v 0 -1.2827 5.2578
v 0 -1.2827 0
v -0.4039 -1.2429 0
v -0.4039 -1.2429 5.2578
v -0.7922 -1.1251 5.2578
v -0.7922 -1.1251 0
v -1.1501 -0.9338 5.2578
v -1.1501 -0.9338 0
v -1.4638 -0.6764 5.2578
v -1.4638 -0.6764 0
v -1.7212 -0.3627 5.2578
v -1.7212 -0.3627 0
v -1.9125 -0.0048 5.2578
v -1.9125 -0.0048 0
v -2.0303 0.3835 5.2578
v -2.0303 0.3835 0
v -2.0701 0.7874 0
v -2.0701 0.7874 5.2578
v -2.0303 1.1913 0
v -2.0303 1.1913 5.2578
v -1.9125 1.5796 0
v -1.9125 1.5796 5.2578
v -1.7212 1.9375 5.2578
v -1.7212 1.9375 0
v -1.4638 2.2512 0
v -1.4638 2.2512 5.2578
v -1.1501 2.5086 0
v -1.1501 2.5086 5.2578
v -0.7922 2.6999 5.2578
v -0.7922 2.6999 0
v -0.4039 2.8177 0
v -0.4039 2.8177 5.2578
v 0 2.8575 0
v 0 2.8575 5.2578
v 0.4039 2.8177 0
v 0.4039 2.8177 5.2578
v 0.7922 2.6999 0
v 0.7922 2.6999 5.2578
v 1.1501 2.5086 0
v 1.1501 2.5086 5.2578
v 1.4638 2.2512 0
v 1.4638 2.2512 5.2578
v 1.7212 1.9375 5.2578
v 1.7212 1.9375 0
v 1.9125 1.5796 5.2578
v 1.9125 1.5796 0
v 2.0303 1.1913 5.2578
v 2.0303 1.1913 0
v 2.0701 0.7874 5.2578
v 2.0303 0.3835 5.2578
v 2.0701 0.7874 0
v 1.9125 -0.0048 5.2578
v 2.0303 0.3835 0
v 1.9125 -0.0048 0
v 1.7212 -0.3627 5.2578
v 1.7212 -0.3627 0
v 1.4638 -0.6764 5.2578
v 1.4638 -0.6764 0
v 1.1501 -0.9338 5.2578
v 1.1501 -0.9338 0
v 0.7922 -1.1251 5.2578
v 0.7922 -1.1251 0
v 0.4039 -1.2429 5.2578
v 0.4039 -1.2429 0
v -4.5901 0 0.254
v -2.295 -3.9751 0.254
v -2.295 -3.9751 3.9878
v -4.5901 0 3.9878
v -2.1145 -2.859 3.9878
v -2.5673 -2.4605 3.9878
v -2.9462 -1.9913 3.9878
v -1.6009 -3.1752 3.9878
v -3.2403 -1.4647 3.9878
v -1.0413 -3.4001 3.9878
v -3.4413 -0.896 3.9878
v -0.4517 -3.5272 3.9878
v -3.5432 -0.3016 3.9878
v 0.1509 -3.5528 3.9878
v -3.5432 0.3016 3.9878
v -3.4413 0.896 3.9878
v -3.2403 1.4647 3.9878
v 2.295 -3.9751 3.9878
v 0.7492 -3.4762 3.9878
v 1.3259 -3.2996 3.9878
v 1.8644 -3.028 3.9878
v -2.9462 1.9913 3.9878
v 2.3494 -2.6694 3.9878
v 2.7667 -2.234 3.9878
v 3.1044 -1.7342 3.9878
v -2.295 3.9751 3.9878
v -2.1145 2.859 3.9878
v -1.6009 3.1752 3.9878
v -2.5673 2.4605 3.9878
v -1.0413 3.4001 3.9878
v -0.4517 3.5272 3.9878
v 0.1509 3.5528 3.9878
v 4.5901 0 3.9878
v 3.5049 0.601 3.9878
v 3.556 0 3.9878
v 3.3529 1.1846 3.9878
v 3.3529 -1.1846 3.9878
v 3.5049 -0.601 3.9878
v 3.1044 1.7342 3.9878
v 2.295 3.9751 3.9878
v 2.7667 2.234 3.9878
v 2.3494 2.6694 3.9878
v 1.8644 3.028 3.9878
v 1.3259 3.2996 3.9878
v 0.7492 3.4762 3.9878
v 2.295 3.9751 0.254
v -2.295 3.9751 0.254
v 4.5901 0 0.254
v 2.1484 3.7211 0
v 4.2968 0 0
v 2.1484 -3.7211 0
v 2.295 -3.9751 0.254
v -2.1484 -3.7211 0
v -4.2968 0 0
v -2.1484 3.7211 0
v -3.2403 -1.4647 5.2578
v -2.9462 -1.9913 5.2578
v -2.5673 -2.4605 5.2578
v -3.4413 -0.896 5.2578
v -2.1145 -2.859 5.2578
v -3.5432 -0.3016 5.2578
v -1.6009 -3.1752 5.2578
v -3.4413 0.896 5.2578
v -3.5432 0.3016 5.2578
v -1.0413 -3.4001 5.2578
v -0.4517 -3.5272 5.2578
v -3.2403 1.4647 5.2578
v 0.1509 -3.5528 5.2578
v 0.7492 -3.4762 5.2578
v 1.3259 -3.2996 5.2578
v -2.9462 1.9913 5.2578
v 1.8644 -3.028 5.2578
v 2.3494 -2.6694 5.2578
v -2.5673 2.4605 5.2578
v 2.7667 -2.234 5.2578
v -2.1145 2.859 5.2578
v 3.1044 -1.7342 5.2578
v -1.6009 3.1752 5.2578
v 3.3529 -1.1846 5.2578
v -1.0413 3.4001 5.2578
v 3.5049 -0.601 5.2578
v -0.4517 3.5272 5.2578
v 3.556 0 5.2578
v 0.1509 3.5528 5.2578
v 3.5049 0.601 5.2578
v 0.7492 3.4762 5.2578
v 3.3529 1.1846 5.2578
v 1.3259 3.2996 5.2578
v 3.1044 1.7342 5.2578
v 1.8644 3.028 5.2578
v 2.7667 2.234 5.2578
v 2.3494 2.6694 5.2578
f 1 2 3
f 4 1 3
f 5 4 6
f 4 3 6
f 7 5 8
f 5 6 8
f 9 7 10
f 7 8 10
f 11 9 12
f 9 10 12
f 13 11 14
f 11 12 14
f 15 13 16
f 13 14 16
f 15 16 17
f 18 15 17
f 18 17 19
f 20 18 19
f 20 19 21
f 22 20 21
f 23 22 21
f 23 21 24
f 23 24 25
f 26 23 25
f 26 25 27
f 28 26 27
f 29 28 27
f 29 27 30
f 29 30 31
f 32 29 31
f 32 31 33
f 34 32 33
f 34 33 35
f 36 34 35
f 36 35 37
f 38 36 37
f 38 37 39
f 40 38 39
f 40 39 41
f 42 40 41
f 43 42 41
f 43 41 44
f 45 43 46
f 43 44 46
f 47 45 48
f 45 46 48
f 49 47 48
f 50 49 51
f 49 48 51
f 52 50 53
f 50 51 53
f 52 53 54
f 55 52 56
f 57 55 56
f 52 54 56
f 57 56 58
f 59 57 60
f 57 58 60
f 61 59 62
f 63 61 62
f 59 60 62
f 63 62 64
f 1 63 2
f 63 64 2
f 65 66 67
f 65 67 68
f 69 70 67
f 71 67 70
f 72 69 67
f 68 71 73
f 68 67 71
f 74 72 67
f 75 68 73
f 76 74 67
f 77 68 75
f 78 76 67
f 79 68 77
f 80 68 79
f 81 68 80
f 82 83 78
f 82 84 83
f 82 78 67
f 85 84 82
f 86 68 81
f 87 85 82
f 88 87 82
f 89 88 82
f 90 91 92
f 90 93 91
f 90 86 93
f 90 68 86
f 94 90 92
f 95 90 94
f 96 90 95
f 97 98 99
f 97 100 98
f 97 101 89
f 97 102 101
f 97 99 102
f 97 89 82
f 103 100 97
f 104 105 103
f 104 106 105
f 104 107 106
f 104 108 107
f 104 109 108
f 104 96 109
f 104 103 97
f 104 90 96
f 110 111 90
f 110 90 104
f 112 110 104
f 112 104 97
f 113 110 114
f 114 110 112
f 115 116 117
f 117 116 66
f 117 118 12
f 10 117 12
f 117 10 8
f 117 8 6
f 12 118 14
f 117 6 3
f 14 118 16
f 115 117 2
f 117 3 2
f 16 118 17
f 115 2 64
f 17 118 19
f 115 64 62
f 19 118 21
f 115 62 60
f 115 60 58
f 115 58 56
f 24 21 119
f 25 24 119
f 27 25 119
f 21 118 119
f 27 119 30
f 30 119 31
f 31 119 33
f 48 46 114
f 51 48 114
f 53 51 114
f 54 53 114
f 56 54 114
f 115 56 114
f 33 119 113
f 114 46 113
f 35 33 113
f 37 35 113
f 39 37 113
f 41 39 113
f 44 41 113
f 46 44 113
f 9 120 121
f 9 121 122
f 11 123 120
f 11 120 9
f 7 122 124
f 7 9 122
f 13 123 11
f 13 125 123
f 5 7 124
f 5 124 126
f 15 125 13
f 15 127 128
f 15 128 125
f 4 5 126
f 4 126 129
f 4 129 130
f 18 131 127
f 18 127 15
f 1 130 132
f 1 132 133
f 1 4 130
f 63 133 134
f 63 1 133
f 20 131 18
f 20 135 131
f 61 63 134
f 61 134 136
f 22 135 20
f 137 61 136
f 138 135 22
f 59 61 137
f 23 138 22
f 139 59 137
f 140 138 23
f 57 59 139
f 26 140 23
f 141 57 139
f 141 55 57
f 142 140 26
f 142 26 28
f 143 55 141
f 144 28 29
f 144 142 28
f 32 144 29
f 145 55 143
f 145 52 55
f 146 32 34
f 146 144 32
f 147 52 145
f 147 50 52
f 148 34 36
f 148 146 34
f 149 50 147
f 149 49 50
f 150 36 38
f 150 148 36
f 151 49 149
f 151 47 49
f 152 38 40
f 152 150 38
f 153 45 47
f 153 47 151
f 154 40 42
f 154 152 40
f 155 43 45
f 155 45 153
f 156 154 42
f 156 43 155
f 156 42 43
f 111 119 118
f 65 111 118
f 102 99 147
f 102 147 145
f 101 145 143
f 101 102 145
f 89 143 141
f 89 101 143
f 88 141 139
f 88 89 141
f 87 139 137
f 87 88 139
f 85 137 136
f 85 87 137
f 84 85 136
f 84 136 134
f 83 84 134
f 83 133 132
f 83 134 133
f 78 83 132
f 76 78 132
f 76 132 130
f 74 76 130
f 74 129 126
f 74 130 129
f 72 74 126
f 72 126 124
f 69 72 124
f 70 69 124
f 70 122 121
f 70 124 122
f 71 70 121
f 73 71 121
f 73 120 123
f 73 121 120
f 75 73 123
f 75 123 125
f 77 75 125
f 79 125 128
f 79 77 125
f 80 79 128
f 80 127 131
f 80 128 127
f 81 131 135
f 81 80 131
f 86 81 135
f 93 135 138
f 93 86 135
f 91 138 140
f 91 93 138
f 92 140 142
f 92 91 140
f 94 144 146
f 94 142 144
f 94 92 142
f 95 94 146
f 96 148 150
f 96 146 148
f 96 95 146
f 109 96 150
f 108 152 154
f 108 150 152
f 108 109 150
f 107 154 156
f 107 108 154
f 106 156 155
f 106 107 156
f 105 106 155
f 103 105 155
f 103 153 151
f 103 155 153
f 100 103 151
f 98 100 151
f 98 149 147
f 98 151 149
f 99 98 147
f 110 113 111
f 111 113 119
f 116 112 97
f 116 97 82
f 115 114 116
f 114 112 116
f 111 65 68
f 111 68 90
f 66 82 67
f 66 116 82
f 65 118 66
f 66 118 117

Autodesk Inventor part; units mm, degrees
ref_plane "YZ Plane" through (0, 0, 0) normal (1, 0, 0) x (0, 1, 0)
ref_plane "XZ Plane" through (0, 0, 0) normal (0, 1, 0) x (-1, 0, 0)
ref_plane "XY Plane" through (0, 0, 0) normal (0, 0, 1) x (1, 0, 0)
sketch "Sketch1" plane through (0, 0, 0) normal (0, 0, 1) x (1, 0, 0)
  line L0 (-4.5901, 0) -> (-2.295, 3.9751)
  line L1 (-2.295, 3.9751) -> (2.295, 3.9751)
  line L2 (2.295, 3.9751) -> (4.5901, 0)
  line L3 (4.5901, 0) -> (2.295, -3.9751)
  line L4 (2.295, -3.9751) -> (-2.295, -3.9751)
  line L5 (-2.295, -3.9751) -> (-4.5901, 0)
  point P0 (0, 0)
  dimension "d2" = 7.9502
extrude "Extrusion1" add sketch "Sketch1" along normal blind 3.9878
sketch "Sketch2" plane through (0, 0, 3.9878) normal (0, 0, 1) x (1, 0, 0)
  circle A0 centre (0, 0) radius 3.556
  dimension "d5" = 7.112
extrude "Extrusion2" add sketch "Sketch2" along normal blind 1.27
sketch "Sketch3" plane through (0, 0, 5.2578) normal (0, 0, 1) x (1, 0, 0)
  circle A0 centre (0, 0) radius 3.556 projected
  circle A1 centre (0, 0.7874) radius 2.1
  dimension "d10" = 4.2
  dimension "d11" = 0.7874
hole "Hole1" at (0, 0.7874, 5.2578) direction (0, 0, -1) diameter 4.1402 end through all
chamfer "Chamfer1" distance 0.254 angle 45 6 edges at (3.4425, -1.9875, 0) (3.4425, 1.9876, 0) (0, 3.9751, 0) (-3.4425, 1.9875, 0) (-3.4425, -1.9876, 0) (0, -3.9751, 0)
properties part number "B18033" material "Stainless Steel"
